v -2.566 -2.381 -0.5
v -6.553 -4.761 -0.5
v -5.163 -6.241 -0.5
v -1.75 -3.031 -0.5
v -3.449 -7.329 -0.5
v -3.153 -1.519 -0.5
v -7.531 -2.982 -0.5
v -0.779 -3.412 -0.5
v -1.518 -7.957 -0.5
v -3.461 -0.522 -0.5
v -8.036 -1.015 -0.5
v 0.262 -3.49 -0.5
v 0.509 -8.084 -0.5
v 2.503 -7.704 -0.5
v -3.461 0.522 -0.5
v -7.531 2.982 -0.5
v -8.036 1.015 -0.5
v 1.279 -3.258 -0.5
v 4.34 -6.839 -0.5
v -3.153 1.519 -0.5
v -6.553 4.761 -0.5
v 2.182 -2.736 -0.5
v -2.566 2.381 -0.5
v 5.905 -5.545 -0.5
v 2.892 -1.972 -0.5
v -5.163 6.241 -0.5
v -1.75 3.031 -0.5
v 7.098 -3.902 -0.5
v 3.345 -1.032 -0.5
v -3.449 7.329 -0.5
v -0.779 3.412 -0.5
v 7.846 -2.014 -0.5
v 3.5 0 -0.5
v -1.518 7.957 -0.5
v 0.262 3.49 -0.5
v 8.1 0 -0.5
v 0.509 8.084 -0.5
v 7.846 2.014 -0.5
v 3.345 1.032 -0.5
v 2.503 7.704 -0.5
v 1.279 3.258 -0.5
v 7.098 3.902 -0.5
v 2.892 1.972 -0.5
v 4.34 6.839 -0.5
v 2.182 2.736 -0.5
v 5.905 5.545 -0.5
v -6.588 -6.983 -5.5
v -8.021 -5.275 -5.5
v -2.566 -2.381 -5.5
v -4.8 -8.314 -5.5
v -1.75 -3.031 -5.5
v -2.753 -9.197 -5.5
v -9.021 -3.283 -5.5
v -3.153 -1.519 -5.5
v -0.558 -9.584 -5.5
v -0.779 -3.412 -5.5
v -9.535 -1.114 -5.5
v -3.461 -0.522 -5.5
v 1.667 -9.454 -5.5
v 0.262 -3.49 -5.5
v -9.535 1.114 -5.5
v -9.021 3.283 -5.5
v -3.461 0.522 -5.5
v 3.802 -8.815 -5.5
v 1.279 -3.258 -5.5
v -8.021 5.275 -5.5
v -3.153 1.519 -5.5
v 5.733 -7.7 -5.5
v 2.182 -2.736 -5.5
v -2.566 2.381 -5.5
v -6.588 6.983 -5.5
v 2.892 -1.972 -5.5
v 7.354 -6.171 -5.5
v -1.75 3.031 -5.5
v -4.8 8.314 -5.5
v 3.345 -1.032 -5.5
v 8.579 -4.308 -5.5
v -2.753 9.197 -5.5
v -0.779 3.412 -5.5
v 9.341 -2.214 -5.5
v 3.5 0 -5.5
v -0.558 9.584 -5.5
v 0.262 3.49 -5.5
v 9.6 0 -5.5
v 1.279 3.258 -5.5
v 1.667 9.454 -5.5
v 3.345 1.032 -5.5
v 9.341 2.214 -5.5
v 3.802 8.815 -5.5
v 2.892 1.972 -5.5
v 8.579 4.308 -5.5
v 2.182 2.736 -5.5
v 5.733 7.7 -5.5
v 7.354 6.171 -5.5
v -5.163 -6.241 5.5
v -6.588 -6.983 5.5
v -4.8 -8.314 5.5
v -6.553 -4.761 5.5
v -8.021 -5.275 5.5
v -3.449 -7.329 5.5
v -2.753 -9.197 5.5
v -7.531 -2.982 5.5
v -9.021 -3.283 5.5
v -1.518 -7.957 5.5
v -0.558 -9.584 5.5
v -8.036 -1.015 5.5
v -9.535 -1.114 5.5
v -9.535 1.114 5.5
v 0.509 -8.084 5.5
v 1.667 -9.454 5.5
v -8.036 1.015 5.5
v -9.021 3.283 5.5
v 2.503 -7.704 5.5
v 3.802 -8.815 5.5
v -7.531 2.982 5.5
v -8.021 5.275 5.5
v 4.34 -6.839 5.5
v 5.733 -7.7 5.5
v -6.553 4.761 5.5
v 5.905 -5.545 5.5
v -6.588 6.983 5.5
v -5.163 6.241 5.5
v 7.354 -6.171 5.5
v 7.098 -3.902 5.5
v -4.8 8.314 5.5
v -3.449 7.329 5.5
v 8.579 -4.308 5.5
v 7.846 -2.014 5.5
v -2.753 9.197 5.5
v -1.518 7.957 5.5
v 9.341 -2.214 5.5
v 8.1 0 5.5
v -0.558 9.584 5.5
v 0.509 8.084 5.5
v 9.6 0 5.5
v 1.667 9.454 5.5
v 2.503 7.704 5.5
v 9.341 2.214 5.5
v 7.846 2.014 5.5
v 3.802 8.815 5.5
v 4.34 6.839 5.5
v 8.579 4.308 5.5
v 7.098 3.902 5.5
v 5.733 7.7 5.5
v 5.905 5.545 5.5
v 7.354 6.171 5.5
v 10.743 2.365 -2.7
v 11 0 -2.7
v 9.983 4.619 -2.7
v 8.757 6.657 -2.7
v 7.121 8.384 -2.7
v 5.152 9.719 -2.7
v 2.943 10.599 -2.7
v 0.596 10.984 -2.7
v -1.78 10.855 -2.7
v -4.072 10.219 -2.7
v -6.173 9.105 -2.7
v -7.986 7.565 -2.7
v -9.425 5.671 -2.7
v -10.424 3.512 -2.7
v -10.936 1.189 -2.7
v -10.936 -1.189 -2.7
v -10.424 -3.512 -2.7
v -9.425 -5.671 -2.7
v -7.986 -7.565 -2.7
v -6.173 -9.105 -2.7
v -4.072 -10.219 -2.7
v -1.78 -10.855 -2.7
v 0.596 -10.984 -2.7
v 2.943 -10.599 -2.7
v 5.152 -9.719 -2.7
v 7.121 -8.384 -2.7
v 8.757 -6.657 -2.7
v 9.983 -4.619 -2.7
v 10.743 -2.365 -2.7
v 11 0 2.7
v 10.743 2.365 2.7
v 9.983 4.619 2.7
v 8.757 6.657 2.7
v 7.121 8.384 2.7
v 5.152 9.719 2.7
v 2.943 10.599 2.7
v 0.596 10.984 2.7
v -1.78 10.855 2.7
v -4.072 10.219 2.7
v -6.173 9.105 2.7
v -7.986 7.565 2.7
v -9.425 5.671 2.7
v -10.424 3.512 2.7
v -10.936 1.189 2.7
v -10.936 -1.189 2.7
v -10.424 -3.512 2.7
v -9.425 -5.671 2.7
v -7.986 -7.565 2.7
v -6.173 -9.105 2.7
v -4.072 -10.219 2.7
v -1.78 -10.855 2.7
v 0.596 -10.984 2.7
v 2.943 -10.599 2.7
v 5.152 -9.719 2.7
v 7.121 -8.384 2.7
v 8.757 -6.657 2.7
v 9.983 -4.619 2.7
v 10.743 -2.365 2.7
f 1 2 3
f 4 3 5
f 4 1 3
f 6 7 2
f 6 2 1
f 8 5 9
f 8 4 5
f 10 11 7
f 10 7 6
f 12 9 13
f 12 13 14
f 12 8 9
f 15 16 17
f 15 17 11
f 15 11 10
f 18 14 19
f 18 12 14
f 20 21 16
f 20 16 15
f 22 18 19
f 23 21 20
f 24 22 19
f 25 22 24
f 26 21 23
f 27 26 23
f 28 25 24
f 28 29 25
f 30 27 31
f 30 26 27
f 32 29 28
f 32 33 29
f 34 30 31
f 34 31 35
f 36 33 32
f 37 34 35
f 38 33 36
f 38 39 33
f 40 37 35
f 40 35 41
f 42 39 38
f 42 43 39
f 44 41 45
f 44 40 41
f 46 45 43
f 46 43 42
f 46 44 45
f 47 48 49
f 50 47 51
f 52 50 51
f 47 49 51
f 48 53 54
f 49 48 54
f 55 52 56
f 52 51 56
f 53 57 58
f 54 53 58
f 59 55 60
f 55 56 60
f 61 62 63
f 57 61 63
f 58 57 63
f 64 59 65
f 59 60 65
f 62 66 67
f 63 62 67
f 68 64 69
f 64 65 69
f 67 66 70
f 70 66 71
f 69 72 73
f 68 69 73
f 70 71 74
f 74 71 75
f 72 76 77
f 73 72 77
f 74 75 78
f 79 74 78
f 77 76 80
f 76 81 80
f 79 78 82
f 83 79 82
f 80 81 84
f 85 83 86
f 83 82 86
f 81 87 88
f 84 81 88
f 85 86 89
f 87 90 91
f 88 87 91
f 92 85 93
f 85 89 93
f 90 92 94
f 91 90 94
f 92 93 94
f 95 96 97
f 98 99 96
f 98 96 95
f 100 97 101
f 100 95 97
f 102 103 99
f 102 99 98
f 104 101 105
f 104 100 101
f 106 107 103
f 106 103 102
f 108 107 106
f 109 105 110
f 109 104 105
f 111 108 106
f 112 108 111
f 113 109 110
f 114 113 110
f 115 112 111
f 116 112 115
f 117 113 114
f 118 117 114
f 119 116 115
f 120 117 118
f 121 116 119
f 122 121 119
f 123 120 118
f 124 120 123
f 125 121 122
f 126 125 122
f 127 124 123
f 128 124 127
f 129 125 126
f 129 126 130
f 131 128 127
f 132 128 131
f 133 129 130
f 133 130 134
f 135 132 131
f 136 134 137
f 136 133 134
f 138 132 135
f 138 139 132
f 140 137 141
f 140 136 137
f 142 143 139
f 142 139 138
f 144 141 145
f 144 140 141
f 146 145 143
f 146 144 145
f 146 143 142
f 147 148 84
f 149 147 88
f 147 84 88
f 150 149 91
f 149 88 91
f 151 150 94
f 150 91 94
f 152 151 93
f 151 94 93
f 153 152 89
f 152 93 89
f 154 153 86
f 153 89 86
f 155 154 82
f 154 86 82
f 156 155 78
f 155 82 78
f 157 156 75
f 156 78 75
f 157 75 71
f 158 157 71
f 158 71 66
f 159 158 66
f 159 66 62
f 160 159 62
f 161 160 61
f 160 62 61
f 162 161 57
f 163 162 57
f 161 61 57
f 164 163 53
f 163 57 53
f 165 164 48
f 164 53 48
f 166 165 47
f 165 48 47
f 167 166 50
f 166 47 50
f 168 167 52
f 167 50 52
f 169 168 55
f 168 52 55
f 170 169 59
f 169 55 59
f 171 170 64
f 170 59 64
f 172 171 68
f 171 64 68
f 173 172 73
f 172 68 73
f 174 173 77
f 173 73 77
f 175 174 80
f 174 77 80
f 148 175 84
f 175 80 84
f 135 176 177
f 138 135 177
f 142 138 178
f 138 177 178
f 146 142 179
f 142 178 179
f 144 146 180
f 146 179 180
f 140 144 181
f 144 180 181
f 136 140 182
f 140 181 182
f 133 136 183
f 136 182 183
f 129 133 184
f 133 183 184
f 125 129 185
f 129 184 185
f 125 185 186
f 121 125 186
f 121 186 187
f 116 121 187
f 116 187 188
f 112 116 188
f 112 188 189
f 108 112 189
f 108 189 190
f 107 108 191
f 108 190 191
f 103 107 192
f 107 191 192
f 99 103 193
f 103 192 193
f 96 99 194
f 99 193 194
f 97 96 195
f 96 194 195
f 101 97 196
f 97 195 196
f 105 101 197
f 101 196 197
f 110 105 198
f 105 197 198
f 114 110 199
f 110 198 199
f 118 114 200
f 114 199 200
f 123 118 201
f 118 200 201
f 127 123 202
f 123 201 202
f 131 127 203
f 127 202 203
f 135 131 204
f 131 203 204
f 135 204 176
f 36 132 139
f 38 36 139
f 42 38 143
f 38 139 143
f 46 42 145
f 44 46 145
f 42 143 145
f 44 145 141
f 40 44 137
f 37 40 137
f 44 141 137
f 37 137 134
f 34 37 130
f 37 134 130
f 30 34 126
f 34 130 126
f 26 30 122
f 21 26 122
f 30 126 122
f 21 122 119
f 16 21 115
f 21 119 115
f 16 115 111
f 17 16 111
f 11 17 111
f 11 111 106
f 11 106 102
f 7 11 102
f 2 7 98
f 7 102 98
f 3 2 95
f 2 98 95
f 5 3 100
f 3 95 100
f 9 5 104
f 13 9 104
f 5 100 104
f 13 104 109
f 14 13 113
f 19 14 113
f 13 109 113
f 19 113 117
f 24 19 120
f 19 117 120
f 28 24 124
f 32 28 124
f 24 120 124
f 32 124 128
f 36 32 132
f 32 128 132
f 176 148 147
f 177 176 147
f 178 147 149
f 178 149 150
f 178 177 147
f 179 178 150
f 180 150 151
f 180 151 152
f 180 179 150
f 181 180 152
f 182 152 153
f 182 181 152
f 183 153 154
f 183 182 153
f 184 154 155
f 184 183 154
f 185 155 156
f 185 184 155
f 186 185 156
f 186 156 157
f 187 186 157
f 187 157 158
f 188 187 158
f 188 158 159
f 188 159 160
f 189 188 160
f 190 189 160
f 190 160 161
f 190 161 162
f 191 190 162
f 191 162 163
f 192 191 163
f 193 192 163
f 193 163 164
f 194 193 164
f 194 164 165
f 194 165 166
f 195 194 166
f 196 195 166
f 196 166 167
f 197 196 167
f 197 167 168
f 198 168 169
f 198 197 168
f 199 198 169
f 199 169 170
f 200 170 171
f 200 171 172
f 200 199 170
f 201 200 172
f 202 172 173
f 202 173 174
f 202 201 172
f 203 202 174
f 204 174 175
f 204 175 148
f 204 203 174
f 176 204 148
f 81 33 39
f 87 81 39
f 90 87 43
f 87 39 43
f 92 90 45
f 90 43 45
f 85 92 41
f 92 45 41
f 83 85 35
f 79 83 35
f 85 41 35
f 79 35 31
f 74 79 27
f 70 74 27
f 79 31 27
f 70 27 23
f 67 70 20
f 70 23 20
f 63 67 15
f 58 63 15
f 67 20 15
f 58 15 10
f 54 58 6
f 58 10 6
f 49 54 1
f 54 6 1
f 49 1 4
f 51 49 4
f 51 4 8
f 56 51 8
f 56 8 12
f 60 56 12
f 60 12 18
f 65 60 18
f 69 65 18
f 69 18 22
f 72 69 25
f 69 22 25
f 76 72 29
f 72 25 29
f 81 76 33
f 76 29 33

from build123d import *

# Parameters (mm, degrees)
F0_R          = 11
F1_DEPTH      = 5.5
F1_DEPTH_BACK = 5.5
F3_SIZE2      = 2.8
F3_SIZE       = 1.4
F4_SIZE2      = 1.4
F4_SIZE       = 2.8
F5_R          = 8.1
F6_DEPTH      = 6
F7_R          = 3.5
F8_DEPTH      = 5


with BuildPart() as f1:
    # F0 (on Top) → F1 (new body, two sides)
    with BuildSketch(Plane.XY) as f1_sk:
        Circle(F0_R)
    extrude(amount=F1_DEPTH)
    extrude(f1_sk.sketch, amount=-F1_DEPTH_BACK)

    # F3
    f3_edges = [f1.edges().sort_by_distance(p)[0] for p in [
        (-11, 0, 5.5),
    ]]
    f3_side = f1.faces().sort_by_distance((0, 0, 5.5))[0]
    chamfer(f3_edges, length=F3_SIZE, length2=F3_SIZE2, reference=f3_side)

    # F4
    f4_edges = [f1.edges().sort_by_distance(p)[0] for p in [
        (-11, 0, -5.5),
    ]]
    f4_side = f1.faces().sort_by_distance((-11, 0, -2.75))[0]
    chamfer(f4_edges, length=F4_SIZE, length2=F4_SIZE2, reference=f4_side)

    # F5 (on face) → F6 (cut)
    with BuildSketch(Plane.XY.offset(5.5)):
        Circle(F5_R)
    extrude(amount=-F6_DEPTH, mode=Mode.SUBTRACT)

    # F7 (on face) → F8 (cut, through all)
    with BuildSketch(Plane.XY.offset(-0.5)):
        Circle(F7_R)
    extrude(amount=-F8_DEPTH, mode=Mode.SUBTRACT)


solid = f1.part
